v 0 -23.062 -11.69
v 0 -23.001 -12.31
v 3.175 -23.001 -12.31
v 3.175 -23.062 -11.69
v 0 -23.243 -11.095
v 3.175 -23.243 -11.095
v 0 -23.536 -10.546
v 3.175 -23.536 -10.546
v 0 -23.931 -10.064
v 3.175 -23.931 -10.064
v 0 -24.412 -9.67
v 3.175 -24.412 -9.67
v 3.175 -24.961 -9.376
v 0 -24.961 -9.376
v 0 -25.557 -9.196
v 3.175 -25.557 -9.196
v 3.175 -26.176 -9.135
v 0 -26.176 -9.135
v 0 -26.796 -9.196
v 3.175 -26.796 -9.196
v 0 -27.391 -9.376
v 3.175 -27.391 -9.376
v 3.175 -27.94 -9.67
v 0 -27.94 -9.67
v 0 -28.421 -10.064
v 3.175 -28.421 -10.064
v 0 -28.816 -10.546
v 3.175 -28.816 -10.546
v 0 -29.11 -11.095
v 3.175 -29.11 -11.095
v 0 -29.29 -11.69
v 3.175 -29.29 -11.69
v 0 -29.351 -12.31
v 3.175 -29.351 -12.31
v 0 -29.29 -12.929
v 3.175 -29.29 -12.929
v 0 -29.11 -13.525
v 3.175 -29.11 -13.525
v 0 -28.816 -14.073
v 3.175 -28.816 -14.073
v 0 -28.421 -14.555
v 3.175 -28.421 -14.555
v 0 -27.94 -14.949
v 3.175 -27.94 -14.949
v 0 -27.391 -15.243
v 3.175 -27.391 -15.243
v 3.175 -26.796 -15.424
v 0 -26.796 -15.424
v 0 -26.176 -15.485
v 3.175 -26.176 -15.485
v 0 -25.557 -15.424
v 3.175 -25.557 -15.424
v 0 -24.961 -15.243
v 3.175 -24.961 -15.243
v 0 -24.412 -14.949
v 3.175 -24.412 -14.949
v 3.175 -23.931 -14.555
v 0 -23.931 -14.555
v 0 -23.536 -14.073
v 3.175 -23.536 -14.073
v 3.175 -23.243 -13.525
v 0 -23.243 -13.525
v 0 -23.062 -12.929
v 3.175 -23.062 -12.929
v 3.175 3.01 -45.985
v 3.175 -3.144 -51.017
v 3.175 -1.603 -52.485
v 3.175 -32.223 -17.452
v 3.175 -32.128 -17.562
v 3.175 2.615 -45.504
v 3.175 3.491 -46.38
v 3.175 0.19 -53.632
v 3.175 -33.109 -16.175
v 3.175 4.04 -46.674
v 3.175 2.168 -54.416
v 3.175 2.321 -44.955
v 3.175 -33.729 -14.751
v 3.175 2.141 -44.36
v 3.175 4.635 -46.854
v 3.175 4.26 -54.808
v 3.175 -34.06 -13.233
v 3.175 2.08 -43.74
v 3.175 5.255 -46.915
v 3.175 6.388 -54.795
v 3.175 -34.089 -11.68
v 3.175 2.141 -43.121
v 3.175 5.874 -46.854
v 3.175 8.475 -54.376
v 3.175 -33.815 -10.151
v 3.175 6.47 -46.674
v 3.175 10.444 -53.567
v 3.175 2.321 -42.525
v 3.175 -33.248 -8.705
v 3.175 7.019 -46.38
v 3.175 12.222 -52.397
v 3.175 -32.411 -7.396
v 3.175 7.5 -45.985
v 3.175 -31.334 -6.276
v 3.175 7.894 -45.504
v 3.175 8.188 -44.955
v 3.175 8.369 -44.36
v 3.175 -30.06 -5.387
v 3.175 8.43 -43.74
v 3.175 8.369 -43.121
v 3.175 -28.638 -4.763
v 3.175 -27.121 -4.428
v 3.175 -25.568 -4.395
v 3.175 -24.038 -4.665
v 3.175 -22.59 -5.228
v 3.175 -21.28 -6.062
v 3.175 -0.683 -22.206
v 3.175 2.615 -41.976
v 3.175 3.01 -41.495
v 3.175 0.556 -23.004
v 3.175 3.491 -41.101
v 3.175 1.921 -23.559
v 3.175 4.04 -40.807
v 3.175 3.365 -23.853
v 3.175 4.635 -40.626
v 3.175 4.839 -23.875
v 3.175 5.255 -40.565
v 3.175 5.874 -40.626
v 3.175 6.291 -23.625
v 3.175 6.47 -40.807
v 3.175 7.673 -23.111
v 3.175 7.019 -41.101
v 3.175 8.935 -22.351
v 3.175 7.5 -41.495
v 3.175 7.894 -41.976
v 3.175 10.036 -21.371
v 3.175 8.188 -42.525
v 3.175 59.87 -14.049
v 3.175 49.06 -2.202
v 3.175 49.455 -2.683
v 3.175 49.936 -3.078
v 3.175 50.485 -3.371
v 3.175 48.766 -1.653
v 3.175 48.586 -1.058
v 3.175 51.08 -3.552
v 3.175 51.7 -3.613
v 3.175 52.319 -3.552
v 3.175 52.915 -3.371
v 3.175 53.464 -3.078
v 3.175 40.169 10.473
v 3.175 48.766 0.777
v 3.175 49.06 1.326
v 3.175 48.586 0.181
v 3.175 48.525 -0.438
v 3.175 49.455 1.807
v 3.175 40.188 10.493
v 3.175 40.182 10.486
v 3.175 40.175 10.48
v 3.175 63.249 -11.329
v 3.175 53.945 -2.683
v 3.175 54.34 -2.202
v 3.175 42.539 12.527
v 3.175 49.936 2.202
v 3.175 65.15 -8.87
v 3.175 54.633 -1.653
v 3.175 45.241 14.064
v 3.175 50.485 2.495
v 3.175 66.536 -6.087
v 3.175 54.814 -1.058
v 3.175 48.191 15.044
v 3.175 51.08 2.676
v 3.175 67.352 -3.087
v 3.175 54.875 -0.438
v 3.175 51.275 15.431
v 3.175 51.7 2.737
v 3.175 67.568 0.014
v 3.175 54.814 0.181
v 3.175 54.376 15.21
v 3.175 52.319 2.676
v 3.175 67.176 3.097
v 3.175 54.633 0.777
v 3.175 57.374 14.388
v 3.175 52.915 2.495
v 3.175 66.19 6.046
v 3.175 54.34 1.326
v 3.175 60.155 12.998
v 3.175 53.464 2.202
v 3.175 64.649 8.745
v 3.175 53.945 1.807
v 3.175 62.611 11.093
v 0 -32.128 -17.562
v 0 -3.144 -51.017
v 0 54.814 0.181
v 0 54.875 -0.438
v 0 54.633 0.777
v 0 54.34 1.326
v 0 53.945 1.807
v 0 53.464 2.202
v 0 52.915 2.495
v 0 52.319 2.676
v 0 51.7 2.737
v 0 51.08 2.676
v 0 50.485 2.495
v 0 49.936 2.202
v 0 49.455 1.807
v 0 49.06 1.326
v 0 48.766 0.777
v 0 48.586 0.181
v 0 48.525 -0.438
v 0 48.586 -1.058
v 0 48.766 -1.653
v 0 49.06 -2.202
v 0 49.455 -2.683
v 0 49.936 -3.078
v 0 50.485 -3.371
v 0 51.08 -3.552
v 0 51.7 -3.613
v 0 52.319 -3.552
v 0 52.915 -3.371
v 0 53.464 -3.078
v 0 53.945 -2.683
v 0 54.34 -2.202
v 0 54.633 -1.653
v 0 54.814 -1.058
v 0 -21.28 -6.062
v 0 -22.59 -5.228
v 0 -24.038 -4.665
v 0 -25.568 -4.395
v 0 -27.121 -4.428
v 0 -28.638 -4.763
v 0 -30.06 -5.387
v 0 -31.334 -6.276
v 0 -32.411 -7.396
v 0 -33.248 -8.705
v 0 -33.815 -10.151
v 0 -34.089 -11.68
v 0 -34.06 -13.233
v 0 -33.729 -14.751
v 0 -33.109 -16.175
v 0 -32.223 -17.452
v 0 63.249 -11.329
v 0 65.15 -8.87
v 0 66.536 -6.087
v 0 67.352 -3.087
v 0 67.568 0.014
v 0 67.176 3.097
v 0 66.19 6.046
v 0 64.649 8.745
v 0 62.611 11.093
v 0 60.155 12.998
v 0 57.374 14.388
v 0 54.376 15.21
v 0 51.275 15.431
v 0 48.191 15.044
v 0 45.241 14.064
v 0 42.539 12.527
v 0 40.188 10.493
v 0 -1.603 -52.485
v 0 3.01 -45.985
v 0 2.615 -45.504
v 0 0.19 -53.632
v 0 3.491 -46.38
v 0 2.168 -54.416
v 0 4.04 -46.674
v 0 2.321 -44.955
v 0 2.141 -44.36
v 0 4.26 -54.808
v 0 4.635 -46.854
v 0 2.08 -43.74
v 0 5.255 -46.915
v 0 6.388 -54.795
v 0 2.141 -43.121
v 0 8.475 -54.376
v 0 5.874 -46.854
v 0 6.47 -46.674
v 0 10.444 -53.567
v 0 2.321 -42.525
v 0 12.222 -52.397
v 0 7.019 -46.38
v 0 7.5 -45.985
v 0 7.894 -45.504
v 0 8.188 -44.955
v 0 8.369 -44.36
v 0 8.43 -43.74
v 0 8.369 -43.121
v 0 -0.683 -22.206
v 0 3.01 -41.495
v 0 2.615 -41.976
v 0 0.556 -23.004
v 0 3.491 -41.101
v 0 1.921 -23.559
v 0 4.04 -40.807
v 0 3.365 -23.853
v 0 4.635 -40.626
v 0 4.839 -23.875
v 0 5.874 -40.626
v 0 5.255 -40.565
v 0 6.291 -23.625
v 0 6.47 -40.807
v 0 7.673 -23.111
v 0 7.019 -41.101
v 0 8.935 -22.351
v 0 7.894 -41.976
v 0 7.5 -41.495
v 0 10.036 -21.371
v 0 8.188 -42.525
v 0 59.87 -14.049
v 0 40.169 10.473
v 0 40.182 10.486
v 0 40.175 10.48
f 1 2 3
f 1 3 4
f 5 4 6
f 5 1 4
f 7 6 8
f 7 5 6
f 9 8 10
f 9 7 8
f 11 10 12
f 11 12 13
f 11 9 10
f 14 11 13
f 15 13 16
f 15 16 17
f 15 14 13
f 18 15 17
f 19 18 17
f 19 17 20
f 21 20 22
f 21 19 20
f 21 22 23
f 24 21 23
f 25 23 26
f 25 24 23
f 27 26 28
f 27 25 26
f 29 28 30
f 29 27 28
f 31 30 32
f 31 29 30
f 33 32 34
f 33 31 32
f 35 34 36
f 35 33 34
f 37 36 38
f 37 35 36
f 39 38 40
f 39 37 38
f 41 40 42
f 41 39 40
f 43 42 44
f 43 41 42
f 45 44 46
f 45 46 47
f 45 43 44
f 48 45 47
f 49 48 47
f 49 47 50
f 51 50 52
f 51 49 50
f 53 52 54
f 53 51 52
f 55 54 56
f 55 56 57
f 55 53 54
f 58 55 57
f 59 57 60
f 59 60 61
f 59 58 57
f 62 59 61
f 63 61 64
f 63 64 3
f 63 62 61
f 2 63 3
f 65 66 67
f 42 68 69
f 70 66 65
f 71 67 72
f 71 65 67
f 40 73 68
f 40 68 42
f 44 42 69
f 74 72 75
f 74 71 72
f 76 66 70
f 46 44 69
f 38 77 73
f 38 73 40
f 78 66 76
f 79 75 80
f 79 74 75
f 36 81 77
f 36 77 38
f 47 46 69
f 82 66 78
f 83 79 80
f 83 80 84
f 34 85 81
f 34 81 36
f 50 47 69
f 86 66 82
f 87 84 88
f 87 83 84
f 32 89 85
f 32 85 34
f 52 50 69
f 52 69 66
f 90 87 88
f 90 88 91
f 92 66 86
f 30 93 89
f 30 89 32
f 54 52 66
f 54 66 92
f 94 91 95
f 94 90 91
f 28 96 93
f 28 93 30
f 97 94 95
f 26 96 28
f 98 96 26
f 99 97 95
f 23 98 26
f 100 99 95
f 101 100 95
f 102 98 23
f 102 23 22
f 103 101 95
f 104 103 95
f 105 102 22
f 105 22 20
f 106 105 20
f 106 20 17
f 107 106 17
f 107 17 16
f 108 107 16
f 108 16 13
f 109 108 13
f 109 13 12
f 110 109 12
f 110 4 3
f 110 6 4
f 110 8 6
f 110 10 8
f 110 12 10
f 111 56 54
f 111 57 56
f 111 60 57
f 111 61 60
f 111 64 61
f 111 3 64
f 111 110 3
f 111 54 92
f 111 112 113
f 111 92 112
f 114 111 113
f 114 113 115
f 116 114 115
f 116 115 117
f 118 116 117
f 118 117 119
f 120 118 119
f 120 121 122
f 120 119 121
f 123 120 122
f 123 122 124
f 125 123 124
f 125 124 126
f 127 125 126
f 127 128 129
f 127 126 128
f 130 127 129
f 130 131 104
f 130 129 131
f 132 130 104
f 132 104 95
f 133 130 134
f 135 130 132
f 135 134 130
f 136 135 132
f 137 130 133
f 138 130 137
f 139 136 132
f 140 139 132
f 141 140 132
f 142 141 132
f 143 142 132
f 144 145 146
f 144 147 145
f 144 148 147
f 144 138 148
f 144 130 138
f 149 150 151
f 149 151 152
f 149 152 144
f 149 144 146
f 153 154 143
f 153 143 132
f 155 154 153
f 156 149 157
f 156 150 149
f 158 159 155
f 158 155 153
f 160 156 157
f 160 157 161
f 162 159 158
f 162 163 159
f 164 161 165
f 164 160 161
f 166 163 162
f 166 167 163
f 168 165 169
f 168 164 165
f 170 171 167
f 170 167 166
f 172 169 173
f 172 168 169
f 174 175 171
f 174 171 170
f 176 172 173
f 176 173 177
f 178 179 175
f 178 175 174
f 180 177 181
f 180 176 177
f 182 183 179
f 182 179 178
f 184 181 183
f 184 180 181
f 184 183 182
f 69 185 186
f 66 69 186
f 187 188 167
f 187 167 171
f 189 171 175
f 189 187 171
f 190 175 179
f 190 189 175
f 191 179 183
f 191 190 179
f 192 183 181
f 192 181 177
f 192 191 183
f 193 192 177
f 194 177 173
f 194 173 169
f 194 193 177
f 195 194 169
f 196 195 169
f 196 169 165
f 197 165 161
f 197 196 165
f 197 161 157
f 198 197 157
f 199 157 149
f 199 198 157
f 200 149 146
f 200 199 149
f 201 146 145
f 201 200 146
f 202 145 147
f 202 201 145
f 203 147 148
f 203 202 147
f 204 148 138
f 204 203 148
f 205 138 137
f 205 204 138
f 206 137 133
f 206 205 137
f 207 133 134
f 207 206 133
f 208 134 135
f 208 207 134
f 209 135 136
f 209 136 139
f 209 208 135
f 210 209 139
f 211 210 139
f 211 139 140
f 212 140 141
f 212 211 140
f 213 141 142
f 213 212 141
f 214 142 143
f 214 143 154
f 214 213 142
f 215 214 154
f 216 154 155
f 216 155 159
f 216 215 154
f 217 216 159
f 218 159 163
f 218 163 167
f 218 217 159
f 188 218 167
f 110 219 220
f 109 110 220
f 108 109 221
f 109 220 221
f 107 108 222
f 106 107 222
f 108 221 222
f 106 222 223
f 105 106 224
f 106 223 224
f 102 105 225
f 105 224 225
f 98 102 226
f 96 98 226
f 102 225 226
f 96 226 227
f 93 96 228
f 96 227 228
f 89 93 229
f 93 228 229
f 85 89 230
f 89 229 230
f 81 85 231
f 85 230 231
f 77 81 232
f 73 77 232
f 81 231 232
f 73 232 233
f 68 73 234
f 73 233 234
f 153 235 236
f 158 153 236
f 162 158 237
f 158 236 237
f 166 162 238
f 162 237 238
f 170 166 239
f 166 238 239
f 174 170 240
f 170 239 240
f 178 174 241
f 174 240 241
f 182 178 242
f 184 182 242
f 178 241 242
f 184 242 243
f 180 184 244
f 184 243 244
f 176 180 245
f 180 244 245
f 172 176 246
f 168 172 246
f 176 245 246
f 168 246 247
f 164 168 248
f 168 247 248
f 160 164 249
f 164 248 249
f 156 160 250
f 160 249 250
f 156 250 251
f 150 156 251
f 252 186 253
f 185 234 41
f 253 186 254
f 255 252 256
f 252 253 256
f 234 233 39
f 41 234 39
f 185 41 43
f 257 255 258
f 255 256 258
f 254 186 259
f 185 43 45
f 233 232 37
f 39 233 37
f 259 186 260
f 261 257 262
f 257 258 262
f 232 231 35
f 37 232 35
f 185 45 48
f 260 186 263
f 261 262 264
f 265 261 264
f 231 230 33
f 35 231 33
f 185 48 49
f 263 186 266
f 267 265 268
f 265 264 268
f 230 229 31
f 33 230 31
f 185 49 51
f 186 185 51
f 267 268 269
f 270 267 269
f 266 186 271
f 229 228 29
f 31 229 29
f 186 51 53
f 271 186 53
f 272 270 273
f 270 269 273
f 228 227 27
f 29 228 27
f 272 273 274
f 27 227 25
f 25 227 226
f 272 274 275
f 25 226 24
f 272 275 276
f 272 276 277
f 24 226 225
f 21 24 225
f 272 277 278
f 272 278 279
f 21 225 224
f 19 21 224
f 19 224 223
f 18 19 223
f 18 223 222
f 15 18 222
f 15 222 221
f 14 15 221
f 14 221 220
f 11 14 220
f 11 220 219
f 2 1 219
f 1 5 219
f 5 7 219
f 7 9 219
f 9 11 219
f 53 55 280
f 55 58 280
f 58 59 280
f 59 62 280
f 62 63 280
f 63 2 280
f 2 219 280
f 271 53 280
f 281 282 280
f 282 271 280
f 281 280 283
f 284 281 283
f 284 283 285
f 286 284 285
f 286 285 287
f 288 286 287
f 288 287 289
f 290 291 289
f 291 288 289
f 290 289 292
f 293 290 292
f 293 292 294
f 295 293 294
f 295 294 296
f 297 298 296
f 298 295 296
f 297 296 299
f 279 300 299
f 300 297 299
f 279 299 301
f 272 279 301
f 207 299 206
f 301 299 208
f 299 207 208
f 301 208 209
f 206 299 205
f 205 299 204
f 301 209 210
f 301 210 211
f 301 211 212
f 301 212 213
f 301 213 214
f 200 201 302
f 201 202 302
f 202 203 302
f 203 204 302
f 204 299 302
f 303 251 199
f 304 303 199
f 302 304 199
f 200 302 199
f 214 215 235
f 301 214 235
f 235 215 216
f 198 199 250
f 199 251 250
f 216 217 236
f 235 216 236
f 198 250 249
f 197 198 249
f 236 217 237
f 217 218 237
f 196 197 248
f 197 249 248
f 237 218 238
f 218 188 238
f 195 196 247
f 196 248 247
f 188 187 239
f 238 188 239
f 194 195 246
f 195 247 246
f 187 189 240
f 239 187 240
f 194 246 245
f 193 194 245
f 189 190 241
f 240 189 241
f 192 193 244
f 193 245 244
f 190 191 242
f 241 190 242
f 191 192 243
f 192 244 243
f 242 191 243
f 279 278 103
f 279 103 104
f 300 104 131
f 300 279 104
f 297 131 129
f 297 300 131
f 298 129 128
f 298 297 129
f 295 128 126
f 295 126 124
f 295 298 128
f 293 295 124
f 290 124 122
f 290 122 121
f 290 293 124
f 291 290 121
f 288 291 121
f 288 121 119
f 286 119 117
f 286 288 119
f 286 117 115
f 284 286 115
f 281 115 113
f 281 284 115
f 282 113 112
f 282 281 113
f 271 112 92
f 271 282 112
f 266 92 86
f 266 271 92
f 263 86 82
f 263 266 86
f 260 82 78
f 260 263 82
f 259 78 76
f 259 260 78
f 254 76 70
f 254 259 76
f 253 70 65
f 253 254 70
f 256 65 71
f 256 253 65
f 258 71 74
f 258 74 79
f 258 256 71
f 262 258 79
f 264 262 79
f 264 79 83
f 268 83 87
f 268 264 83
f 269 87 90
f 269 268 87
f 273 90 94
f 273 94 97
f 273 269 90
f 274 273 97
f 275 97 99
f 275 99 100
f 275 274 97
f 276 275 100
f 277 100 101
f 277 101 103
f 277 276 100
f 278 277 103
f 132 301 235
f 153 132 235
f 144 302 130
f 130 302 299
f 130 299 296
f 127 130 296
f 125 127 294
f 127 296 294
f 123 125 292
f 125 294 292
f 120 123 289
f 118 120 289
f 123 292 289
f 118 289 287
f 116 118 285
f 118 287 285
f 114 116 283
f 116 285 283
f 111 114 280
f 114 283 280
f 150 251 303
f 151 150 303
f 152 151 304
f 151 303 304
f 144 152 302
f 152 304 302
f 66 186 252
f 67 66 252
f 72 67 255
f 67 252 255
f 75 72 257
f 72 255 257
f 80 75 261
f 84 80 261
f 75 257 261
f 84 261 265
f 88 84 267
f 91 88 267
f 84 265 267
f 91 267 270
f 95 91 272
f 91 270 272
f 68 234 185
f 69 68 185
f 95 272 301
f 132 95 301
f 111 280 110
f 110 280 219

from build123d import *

# Parameters (mm, degrees)
F0_R     = 3.175
F1_DEPTH = 3.175


with BuildPart() as f1:
    # F0 (on Right) → F1 (new body)
    with BuildSketch(Plane.YZ):
        with BuildLine():
            Line((-0.683293, -22.206229), (-21.279692, -6.062372))
            ThreePointArc((-21.279692, -6.062372), (-31.89988, -6.809987), (-32.223099, -17.45155))
            Line((-32.223099, -17.45155), (-32.127586, -17.5618))
            Line((-32.127586, -17.5618), (-3.144408, -51.016742))
            ThreePointArc((-3.144408, -51.016742), (4.260096, -54.808331), (12.221904, -52.397431))
            Line((12.221904, -52.397431), (59.870195, -14.049133))
            Line((59.870195, -14.049133), (63.249417, -11.329467))
            ThreePointArc((63.249417, -11.329467), (62.611086, 11.0927), (40.187851, 10.493082))
            ThreePointArc((40.187851, 10.493082), (40.178419, 10.48314), (40.168995, 10.47319))
            Line((40.168995, 10.47319), (10.036033, -21.370629))
            ThreePointArc((10.036033, -21.370629), (4.839042, -23.875239), (-0.683293, -22.206229))
        make_face()
        with Locations((5.254567, -43.740418)):
            Circle(F0_R, mode=Mode.SUBTRACT)
        with Locations((-26.176328, -12.30952)):
            Circle(F0_R, mode=Mode.SUBTRACT)
        with Locations((51.699796, -0.4381)):
            Circle(F0_R, mode=Mode.SUBTRACT)
    extrude(amount=F1_DEPTH)


solid = f1.part
